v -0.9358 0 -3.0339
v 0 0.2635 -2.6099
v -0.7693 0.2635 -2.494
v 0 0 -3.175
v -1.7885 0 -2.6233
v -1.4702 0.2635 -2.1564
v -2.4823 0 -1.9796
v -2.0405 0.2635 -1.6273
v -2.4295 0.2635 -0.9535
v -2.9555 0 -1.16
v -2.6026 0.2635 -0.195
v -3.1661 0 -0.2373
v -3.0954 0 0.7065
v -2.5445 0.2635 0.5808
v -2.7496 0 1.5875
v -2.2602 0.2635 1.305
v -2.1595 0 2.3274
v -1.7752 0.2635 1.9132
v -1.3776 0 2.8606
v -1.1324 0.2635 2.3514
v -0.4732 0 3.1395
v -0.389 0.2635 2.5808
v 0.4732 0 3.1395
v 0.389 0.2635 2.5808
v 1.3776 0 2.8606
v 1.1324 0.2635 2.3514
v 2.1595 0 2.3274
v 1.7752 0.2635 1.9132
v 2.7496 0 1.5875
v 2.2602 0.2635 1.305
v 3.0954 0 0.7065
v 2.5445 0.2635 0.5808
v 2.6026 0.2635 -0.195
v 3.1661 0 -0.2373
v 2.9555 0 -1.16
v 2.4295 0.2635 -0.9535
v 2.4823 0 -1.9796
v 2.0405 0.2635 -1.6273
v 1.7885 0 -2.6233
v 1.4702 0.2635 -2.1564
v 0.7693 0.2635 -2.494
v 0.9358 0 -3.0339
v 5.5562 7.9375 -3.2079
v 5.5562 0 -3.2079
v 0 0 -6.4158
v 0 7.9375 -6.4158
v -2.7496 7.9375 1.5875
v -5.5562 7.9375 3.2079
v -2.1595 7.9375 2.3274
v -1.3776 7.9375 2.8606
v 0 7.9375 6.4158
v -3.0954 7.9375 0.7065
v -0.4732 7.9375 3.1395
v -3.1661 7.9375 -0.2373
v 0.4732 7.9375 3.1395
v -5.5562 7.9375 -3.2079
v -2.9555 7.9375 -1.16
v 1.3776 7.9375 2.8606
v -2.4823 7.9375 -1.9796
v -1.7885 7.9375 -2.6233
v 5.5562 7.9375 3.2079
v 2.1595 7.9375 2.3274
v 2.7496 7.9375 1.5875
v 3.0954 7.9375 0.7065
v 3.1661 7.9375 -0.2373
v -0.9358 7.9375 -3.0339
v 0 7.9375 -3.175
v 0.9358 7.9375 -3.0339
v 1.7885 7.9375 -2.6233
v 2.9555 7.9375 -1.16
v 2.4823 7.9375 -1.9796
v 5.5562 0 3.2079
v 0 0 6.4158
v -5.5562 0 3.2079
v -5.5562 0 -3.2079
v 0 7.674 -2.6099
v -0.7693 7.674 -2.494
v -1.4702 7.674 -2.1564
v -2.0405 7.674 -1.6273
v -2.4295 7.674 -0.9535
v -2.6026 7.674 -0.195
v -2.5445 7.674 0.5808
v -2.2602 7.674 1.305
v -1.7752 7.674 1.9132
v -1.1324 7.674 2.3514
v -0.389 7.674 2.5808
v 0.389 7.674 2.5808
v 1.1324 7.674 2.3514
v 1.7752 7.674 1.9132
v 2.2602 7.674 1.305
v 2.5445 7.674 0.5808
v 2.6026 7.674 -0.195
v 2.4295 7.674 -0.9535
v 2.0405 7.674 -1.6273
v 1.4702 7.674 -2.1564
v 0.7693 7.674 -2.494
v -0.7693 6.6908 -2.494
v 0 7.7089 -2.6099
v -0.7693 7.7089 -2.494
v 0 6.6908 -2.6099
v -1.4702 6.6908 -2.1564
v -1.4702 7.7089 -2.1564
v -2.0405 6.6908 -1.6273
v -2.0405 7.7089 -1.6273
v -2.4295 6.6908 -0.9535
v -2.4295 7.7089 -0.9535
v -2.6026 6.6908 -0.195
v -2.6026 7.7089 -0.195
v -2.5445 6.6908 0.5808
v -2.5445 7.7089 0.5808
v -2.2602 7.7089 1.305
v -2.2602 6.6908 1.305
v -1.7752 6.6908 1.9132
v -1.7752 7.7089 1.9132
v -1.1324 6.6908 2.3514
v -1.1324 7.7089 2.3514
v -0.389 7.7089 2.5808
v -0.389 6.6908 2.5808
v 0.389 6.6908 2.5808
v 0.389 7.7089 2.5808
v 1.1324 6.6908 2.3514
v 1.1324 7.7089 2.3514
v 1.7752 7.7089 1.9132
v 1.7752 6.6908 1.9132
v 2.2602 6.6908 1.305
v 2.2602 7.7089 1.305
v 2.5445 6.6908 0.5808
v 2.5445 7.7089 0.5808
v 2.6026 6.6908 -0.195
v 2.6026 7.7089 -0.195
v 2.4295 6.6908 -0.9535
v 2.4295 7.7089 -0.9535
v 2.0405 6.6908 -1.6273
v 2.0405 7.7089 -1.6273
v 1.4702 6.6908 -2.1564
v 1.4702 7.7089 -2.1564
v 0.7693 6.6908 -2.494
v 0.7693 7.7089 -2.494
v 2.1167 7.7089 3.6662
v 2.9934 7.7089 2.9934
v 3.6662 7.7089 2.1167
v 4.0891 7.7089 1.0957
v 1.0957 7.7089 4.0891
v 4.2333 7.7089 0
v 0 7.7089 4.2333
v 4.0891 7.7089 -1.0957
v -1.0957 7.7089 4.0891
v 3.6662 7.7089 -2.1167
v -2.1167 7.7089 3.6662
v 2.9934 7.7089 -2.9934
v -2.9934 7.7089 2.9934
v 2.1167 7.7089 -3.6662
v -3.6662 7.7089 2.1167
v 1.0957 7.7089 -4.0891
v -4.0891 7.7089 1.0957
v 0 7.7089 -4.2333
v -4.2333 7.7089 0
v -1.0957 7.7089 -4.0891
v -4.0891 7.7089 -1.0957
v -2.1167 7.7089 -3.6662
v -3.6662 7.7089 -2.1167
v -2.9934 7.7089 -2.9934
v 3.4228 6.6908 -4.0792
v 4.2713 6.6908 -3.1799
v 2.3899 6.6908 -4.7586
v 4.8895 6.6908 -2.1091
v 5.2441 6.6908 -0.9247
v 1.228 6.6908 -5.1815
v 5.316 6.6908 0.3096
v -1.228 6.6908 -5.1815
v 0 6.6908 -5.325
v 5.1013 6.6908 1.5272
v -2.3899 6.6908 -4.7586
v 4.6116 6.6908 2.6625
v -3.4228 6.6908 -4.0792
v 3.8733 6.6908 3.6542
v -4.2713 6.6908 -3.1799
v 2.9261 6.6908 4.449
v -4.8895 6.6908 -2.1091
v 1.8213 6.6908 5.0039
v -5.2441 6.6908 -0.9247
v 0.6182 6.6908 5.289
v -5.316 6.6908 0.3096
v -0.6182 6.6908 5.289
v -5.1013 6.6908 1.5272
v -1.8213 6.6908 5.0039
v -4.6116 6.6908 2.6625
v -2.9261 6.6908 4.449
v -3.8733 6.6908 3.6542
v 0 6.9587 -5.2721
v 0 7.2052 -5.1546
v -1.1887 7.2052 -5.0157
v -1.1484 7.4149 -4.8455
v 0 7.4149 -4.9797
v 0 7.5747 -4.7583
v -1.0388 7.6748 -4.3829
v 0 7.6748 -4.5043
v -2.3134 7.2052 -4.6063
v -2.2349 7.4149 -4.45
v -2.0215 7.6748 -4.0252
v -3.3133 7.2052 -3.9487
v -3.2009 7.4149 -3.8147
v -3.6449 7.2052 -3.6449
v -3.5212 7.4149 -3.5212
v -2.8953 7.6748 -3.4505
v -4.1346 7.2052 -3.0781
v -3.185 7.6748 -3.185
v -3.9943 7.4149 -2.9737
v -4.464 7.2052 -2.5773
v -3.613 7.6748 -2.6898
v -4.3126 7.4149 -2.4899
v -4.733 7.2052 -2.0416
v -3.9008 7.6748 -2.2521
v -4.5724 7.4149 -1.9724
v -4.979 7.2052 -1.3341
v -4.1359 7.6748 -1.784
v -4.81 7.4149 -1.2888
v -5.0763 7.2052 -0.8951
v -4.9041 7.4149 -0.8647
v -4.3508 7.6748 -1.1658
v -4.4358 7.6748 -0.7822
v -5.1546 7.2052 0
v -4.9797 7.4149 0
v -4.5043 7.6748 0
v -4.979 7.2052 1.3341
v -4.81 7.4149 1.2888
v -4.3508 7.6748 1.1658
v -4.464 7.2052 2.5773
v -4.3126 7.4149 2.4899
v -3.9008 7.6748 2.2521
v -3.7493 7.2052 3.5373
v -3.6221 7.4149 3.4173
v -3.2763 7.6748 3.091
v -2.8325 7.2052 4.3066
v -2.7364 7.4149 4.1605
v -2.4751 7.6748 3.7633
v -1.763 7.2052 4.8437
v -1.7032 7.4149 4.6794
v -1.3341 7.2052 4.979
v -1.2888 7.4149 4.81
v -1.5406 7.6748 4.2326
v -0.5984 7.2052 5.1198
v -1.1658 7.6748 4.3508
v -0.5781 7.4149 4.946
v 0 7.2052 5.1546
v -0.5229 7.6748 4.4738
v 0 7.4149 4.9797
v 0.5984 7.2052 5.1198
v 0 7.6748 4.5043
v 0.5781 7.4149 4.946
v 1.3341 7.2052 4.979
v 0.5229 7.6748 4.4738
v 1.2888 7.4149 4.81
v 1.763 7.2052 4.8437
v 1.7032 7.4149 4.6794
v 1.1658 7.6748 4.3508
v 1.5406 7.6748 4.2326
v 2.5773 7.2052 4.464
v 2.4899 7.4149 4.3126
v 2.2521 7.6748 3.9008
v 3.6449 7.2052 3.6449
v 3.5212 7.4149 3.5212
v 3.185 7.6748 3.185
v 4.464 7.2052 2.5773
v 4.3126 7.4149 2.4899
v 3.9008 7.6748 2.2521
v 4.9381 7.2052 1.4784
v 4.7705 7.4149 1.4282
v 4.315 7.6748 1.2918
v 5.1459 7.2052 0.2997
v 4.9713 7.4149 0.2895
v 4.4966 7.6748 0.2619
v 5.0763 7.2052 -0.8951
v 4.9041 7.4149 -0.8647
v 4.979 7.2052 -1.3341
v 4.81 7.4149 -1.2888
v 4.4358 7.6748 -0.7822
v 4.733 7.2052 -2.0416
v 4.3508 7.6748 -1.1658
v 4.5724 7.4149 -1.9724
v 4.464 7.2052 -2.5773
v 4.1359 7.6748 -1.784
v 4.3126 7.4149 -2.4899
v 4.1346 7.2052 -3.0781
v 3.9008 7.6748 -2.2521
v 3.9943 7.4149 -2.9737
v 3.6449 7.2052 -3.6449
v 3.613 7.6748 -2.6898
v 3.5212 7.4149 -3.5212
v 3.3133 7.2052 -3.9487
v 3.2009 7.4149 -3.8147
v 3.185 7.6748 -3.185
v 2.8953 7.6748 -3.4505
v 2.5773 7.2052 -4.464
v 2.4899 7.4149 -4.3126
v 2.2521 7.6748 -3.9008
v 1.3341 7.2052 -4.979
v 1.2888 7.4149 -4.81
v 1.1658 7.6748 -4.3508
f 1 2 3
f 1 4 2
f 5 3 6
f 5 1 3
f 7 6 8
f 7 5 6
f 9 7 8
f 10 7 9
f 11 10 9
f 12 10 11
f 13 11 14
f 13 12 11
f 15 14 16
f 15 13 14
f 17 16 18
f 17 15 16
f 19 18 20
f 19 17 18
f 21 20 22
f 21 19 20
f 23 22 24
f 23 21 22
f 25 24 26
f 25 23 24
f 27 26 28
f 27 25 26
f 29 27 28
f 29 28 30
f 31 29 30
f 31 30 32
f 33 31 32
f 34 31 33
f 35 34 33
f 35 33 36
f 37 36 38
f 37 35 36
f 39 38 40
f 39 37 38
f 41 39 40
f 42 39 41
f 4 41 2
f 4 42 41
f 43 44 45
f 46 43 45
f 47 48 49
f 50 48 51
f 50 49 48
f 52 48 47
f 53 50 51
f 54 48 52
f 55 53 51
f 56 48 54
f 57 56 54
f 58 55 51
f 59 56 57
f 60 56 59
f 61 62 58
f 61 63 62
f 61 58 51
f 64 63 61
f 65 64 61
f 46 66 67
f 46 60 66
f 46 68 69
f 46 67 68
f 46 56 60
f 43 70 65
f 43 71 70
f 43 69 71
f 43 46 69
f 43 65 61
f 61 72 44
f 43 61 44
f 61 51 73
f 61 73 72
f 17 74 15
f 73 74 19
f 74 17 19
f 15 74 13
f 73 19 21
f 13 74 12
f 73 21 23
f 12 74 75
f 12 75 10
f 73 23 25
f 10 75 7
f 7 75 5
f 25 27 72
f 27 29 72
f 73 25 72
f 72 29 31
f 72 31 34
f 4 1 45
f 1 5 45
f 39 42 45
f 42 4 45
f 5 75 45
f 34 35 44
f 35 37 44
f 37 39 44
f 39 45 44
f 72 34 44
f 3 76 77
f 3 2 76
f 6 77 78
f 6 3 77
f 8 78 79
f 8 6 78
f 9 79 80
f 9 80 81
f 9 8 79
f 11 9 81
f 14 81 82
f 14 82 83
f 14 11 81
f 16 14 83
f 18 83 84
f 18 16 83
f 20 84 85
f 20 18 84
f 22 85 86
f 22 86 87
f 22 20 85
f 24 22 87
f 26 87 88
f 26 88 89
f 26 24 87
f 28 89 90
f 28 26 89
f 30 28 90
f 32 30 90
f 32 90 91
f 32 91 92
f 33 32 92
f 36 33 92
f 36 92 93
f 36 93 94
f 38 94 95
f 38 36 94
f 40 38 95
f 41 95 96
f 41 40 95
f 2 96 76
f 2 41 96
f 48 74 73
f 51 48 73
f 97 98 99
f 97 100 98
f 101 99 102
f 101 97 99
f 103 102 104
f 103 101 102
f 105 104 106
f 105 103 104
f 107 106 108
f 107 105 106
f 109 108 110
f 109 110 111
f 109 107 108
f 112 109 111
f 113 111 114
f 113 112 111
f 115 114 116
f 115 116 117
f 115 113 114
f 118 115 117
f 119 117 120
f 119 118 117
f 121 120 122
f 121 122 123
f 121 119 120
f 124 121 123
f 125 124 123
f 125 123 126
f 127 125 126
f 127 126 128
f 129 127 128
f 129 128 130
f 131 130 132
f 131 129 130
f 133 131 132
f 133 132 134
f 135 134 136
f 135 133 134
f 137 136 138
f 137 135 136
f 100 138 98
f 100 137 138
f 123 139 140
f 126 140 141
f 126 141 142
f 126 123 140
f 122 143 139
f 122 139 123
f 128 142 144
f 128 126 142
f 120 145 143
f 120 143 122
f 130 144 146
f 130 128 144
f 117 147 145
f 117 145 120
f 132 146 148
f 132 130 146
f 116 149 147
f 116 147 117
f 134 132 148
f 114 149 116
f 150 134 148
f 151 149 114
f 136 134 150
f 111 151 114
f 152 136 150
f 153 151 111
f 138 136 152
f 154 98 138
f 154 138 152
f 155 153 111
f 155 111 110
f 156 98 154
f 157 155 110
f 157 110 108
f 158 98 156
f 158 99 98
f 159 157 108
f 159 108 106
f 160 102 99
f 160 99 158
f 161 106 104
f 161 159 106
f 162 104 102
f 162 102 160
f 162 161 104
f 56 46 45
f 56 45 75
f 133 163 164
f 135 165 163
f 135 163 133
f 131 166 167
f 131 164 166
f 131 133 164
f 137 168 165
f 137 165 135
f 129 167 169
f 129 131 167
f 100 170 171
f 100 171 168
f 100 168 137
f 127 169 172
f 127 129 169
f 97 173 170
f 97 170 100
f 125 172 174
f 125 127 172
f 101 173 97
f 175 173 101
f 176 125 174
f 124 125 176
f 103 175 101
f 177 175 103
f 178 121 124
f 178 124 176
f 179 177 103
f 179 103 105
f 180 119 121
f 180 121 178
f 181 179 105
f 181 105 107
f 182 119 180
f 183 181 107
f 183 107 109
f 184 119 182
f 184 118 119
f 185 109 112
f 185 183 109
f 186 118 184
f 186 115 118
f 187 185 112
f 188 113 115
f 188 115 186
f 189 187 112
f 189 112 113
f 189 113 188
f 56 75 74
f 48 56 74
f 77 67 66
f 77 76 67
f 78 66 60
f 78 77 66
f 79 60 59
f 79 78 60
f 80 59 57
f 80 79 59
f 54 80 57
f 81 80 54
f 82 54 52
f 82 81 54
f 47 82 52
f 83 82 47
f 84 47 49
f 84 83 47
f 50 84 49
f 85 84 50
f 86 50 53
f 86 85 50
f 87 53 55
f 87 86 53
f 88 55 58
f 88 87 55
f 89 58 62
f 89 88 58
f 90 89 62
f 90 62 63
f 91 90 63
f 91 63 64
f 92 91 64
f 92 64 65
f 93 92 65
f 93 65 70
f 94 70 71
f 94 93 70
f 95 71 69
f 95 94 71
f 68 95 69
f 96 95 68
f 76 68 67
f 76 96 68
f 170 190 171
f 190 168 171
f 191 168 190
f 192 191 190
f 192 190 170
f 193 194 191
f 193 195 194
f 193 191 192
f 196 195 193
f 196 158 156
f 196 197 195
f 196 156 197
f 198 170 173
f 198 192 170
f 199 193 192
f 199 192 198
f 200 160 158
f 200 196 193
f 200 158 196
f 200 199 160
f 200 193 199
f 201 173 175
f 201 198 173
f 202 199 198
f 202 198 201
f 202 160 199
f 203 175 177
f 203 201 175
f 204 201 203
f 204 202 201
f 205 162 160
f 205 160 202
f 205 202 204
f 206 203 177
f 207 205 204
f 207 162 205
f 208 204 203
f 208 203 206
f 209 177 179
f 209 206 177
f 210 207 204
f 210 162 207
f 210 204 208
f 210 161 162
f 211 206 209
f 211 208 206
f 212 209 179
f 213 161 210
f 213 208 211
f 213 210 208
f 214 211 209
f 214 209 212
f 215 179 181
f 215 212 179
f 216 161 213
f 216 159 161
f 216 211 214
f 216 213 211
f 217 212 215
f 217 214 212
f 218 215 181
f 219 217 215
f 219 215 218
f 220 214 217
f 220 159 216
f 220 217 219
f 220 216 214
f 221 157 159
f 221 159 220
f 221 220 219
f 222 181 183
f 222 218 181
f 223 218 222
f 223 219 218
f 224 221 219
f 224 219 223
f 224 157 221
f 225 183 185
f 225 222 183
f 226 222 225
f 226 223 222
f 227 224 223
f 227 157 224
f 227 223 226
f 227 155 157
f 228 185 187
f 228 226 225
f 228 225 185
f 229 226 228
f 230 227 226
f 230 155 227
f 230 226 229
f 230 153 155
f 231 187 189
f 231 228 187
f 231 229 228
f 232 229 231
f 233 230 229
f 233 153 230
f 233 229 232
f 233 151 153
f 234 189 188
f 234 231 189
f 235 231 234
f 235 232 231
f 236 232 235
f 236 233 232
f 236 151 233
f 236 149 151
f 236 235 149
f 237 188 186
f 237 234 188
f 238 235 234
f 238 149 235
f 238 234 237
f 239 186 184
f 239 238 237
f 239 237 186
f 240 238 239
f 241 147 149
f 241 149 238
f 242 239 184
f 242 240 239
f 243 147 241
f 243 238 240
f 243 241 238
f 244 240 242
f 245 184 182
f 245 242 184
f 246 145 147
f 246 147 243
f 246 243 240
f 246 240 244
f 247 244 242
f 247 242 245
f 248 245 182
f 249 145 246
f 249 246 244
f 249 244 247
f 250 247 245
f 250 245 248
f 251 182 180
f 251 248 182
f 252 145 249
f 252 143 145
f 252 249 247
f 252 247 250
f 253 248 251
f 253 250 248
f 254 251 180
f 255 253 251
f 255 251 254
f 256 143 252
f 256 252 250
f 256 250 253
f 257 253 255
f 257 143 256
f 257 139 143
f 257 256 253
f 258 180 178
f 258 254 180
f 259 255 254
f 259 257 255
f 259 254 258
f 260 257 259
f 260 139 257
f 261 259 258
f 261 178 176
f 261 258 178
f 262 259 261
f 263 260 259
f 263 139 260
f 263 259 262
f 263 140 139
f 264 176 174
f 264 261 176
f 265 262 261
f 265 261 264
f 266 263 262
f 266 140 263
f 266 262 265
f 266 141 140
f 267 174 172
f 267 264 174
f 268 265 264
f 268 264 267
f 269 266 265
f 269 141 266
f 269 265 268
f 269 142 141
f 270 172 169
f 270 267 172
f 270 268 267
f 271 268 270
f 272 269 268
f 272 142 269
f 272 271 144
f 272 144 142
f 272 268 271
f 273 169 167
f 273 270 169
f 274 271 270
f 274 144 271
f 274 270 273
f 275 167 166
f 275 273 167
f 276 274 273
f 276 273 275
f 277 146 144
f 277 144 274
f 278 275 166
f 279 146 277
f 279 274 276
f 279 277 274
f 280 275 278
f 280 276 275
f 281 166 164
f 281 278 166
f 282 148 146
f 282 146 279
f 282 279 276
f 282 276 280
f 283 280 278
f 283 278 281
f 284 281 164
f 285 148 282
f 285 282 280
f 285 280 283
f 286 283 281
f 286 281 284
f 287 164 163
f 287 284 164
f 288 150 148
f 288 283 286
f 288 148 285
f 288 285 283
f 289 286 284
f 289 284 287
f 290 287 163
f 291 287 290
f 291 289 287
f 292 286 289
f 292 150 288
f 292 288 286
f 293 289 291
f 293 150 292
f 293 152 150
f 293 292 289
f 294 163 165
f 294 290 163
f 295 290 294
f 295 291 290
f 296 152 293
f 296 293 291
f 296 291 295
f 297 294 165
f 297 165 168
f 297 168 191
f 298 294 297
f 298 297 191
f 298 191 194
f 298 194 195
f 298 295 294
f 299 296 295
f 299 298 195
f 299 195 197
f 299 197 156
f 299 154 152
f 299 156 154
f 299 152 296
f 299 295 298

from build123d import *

# Parameters (mm, degrees)
EXTRUDE1_DEPTH = 7.9375


with BuildPart() as part:
    # Sketch1 → Extrude1 (new body)
    with BuildSketch(Plane(origin=(0, 0, 0), x_dir=(1, 0, 0), z_dir=(0, 1, 0))):
        Polygon((0, 6.415804866), (-5.55625, 3.207902433), (-5.55625, -3.207902433), (0, -6.415804866), (5.55625, -3.207902433), (5.55625, 3.207902433), align=None)
    extrude(amount=EXTRUDE1_DEPTH)

    # Sketch4 → Cut-Revolve2 (revolve, cut)
    with BuildSketch(Plane(origin=(0, 0, 0), x_dir=(0, 0, -1), z_dir=(1, 0, 0))):
        Polygon((0, 7.9375), (3.175, 7.9375), (2.609908356, 7.673993439), (2.609908356, 0.263506561), (3.175, 0), (0, 0), align=None)
    revolve(axis=Axis((0, 7.9375, 0), (0, 1, 0)), mode=Mode.SUBTRACT)


with BuildPart() as body_2:
    # Sketch7 → Revolve2 (revolve)
    with BuildSketch(Plane(origin=(0, 0, 0), x_dir=(0, 0, -1), z_dir=(1, 0, 0))):
        with BuildLine():
            Line((2.609908356, 6.690783333), (5.324993778, 6.690783333))
            ThreePointArc((5.324993778, 6.690783333), (4.979705237, 7.4148695), (4.233333333, 7.7089))
            Line((4.233333333, 7.7089), (2.609908356, 7.7089))
            Line((2.609908356, 7.7089), (2.609908356, 6.690783333))
        make_face()
    revolve(axis=Axis((0, 6.690783333, 0), (0, 1, 0)))


solid = Compound([part.part, body_2.part])
